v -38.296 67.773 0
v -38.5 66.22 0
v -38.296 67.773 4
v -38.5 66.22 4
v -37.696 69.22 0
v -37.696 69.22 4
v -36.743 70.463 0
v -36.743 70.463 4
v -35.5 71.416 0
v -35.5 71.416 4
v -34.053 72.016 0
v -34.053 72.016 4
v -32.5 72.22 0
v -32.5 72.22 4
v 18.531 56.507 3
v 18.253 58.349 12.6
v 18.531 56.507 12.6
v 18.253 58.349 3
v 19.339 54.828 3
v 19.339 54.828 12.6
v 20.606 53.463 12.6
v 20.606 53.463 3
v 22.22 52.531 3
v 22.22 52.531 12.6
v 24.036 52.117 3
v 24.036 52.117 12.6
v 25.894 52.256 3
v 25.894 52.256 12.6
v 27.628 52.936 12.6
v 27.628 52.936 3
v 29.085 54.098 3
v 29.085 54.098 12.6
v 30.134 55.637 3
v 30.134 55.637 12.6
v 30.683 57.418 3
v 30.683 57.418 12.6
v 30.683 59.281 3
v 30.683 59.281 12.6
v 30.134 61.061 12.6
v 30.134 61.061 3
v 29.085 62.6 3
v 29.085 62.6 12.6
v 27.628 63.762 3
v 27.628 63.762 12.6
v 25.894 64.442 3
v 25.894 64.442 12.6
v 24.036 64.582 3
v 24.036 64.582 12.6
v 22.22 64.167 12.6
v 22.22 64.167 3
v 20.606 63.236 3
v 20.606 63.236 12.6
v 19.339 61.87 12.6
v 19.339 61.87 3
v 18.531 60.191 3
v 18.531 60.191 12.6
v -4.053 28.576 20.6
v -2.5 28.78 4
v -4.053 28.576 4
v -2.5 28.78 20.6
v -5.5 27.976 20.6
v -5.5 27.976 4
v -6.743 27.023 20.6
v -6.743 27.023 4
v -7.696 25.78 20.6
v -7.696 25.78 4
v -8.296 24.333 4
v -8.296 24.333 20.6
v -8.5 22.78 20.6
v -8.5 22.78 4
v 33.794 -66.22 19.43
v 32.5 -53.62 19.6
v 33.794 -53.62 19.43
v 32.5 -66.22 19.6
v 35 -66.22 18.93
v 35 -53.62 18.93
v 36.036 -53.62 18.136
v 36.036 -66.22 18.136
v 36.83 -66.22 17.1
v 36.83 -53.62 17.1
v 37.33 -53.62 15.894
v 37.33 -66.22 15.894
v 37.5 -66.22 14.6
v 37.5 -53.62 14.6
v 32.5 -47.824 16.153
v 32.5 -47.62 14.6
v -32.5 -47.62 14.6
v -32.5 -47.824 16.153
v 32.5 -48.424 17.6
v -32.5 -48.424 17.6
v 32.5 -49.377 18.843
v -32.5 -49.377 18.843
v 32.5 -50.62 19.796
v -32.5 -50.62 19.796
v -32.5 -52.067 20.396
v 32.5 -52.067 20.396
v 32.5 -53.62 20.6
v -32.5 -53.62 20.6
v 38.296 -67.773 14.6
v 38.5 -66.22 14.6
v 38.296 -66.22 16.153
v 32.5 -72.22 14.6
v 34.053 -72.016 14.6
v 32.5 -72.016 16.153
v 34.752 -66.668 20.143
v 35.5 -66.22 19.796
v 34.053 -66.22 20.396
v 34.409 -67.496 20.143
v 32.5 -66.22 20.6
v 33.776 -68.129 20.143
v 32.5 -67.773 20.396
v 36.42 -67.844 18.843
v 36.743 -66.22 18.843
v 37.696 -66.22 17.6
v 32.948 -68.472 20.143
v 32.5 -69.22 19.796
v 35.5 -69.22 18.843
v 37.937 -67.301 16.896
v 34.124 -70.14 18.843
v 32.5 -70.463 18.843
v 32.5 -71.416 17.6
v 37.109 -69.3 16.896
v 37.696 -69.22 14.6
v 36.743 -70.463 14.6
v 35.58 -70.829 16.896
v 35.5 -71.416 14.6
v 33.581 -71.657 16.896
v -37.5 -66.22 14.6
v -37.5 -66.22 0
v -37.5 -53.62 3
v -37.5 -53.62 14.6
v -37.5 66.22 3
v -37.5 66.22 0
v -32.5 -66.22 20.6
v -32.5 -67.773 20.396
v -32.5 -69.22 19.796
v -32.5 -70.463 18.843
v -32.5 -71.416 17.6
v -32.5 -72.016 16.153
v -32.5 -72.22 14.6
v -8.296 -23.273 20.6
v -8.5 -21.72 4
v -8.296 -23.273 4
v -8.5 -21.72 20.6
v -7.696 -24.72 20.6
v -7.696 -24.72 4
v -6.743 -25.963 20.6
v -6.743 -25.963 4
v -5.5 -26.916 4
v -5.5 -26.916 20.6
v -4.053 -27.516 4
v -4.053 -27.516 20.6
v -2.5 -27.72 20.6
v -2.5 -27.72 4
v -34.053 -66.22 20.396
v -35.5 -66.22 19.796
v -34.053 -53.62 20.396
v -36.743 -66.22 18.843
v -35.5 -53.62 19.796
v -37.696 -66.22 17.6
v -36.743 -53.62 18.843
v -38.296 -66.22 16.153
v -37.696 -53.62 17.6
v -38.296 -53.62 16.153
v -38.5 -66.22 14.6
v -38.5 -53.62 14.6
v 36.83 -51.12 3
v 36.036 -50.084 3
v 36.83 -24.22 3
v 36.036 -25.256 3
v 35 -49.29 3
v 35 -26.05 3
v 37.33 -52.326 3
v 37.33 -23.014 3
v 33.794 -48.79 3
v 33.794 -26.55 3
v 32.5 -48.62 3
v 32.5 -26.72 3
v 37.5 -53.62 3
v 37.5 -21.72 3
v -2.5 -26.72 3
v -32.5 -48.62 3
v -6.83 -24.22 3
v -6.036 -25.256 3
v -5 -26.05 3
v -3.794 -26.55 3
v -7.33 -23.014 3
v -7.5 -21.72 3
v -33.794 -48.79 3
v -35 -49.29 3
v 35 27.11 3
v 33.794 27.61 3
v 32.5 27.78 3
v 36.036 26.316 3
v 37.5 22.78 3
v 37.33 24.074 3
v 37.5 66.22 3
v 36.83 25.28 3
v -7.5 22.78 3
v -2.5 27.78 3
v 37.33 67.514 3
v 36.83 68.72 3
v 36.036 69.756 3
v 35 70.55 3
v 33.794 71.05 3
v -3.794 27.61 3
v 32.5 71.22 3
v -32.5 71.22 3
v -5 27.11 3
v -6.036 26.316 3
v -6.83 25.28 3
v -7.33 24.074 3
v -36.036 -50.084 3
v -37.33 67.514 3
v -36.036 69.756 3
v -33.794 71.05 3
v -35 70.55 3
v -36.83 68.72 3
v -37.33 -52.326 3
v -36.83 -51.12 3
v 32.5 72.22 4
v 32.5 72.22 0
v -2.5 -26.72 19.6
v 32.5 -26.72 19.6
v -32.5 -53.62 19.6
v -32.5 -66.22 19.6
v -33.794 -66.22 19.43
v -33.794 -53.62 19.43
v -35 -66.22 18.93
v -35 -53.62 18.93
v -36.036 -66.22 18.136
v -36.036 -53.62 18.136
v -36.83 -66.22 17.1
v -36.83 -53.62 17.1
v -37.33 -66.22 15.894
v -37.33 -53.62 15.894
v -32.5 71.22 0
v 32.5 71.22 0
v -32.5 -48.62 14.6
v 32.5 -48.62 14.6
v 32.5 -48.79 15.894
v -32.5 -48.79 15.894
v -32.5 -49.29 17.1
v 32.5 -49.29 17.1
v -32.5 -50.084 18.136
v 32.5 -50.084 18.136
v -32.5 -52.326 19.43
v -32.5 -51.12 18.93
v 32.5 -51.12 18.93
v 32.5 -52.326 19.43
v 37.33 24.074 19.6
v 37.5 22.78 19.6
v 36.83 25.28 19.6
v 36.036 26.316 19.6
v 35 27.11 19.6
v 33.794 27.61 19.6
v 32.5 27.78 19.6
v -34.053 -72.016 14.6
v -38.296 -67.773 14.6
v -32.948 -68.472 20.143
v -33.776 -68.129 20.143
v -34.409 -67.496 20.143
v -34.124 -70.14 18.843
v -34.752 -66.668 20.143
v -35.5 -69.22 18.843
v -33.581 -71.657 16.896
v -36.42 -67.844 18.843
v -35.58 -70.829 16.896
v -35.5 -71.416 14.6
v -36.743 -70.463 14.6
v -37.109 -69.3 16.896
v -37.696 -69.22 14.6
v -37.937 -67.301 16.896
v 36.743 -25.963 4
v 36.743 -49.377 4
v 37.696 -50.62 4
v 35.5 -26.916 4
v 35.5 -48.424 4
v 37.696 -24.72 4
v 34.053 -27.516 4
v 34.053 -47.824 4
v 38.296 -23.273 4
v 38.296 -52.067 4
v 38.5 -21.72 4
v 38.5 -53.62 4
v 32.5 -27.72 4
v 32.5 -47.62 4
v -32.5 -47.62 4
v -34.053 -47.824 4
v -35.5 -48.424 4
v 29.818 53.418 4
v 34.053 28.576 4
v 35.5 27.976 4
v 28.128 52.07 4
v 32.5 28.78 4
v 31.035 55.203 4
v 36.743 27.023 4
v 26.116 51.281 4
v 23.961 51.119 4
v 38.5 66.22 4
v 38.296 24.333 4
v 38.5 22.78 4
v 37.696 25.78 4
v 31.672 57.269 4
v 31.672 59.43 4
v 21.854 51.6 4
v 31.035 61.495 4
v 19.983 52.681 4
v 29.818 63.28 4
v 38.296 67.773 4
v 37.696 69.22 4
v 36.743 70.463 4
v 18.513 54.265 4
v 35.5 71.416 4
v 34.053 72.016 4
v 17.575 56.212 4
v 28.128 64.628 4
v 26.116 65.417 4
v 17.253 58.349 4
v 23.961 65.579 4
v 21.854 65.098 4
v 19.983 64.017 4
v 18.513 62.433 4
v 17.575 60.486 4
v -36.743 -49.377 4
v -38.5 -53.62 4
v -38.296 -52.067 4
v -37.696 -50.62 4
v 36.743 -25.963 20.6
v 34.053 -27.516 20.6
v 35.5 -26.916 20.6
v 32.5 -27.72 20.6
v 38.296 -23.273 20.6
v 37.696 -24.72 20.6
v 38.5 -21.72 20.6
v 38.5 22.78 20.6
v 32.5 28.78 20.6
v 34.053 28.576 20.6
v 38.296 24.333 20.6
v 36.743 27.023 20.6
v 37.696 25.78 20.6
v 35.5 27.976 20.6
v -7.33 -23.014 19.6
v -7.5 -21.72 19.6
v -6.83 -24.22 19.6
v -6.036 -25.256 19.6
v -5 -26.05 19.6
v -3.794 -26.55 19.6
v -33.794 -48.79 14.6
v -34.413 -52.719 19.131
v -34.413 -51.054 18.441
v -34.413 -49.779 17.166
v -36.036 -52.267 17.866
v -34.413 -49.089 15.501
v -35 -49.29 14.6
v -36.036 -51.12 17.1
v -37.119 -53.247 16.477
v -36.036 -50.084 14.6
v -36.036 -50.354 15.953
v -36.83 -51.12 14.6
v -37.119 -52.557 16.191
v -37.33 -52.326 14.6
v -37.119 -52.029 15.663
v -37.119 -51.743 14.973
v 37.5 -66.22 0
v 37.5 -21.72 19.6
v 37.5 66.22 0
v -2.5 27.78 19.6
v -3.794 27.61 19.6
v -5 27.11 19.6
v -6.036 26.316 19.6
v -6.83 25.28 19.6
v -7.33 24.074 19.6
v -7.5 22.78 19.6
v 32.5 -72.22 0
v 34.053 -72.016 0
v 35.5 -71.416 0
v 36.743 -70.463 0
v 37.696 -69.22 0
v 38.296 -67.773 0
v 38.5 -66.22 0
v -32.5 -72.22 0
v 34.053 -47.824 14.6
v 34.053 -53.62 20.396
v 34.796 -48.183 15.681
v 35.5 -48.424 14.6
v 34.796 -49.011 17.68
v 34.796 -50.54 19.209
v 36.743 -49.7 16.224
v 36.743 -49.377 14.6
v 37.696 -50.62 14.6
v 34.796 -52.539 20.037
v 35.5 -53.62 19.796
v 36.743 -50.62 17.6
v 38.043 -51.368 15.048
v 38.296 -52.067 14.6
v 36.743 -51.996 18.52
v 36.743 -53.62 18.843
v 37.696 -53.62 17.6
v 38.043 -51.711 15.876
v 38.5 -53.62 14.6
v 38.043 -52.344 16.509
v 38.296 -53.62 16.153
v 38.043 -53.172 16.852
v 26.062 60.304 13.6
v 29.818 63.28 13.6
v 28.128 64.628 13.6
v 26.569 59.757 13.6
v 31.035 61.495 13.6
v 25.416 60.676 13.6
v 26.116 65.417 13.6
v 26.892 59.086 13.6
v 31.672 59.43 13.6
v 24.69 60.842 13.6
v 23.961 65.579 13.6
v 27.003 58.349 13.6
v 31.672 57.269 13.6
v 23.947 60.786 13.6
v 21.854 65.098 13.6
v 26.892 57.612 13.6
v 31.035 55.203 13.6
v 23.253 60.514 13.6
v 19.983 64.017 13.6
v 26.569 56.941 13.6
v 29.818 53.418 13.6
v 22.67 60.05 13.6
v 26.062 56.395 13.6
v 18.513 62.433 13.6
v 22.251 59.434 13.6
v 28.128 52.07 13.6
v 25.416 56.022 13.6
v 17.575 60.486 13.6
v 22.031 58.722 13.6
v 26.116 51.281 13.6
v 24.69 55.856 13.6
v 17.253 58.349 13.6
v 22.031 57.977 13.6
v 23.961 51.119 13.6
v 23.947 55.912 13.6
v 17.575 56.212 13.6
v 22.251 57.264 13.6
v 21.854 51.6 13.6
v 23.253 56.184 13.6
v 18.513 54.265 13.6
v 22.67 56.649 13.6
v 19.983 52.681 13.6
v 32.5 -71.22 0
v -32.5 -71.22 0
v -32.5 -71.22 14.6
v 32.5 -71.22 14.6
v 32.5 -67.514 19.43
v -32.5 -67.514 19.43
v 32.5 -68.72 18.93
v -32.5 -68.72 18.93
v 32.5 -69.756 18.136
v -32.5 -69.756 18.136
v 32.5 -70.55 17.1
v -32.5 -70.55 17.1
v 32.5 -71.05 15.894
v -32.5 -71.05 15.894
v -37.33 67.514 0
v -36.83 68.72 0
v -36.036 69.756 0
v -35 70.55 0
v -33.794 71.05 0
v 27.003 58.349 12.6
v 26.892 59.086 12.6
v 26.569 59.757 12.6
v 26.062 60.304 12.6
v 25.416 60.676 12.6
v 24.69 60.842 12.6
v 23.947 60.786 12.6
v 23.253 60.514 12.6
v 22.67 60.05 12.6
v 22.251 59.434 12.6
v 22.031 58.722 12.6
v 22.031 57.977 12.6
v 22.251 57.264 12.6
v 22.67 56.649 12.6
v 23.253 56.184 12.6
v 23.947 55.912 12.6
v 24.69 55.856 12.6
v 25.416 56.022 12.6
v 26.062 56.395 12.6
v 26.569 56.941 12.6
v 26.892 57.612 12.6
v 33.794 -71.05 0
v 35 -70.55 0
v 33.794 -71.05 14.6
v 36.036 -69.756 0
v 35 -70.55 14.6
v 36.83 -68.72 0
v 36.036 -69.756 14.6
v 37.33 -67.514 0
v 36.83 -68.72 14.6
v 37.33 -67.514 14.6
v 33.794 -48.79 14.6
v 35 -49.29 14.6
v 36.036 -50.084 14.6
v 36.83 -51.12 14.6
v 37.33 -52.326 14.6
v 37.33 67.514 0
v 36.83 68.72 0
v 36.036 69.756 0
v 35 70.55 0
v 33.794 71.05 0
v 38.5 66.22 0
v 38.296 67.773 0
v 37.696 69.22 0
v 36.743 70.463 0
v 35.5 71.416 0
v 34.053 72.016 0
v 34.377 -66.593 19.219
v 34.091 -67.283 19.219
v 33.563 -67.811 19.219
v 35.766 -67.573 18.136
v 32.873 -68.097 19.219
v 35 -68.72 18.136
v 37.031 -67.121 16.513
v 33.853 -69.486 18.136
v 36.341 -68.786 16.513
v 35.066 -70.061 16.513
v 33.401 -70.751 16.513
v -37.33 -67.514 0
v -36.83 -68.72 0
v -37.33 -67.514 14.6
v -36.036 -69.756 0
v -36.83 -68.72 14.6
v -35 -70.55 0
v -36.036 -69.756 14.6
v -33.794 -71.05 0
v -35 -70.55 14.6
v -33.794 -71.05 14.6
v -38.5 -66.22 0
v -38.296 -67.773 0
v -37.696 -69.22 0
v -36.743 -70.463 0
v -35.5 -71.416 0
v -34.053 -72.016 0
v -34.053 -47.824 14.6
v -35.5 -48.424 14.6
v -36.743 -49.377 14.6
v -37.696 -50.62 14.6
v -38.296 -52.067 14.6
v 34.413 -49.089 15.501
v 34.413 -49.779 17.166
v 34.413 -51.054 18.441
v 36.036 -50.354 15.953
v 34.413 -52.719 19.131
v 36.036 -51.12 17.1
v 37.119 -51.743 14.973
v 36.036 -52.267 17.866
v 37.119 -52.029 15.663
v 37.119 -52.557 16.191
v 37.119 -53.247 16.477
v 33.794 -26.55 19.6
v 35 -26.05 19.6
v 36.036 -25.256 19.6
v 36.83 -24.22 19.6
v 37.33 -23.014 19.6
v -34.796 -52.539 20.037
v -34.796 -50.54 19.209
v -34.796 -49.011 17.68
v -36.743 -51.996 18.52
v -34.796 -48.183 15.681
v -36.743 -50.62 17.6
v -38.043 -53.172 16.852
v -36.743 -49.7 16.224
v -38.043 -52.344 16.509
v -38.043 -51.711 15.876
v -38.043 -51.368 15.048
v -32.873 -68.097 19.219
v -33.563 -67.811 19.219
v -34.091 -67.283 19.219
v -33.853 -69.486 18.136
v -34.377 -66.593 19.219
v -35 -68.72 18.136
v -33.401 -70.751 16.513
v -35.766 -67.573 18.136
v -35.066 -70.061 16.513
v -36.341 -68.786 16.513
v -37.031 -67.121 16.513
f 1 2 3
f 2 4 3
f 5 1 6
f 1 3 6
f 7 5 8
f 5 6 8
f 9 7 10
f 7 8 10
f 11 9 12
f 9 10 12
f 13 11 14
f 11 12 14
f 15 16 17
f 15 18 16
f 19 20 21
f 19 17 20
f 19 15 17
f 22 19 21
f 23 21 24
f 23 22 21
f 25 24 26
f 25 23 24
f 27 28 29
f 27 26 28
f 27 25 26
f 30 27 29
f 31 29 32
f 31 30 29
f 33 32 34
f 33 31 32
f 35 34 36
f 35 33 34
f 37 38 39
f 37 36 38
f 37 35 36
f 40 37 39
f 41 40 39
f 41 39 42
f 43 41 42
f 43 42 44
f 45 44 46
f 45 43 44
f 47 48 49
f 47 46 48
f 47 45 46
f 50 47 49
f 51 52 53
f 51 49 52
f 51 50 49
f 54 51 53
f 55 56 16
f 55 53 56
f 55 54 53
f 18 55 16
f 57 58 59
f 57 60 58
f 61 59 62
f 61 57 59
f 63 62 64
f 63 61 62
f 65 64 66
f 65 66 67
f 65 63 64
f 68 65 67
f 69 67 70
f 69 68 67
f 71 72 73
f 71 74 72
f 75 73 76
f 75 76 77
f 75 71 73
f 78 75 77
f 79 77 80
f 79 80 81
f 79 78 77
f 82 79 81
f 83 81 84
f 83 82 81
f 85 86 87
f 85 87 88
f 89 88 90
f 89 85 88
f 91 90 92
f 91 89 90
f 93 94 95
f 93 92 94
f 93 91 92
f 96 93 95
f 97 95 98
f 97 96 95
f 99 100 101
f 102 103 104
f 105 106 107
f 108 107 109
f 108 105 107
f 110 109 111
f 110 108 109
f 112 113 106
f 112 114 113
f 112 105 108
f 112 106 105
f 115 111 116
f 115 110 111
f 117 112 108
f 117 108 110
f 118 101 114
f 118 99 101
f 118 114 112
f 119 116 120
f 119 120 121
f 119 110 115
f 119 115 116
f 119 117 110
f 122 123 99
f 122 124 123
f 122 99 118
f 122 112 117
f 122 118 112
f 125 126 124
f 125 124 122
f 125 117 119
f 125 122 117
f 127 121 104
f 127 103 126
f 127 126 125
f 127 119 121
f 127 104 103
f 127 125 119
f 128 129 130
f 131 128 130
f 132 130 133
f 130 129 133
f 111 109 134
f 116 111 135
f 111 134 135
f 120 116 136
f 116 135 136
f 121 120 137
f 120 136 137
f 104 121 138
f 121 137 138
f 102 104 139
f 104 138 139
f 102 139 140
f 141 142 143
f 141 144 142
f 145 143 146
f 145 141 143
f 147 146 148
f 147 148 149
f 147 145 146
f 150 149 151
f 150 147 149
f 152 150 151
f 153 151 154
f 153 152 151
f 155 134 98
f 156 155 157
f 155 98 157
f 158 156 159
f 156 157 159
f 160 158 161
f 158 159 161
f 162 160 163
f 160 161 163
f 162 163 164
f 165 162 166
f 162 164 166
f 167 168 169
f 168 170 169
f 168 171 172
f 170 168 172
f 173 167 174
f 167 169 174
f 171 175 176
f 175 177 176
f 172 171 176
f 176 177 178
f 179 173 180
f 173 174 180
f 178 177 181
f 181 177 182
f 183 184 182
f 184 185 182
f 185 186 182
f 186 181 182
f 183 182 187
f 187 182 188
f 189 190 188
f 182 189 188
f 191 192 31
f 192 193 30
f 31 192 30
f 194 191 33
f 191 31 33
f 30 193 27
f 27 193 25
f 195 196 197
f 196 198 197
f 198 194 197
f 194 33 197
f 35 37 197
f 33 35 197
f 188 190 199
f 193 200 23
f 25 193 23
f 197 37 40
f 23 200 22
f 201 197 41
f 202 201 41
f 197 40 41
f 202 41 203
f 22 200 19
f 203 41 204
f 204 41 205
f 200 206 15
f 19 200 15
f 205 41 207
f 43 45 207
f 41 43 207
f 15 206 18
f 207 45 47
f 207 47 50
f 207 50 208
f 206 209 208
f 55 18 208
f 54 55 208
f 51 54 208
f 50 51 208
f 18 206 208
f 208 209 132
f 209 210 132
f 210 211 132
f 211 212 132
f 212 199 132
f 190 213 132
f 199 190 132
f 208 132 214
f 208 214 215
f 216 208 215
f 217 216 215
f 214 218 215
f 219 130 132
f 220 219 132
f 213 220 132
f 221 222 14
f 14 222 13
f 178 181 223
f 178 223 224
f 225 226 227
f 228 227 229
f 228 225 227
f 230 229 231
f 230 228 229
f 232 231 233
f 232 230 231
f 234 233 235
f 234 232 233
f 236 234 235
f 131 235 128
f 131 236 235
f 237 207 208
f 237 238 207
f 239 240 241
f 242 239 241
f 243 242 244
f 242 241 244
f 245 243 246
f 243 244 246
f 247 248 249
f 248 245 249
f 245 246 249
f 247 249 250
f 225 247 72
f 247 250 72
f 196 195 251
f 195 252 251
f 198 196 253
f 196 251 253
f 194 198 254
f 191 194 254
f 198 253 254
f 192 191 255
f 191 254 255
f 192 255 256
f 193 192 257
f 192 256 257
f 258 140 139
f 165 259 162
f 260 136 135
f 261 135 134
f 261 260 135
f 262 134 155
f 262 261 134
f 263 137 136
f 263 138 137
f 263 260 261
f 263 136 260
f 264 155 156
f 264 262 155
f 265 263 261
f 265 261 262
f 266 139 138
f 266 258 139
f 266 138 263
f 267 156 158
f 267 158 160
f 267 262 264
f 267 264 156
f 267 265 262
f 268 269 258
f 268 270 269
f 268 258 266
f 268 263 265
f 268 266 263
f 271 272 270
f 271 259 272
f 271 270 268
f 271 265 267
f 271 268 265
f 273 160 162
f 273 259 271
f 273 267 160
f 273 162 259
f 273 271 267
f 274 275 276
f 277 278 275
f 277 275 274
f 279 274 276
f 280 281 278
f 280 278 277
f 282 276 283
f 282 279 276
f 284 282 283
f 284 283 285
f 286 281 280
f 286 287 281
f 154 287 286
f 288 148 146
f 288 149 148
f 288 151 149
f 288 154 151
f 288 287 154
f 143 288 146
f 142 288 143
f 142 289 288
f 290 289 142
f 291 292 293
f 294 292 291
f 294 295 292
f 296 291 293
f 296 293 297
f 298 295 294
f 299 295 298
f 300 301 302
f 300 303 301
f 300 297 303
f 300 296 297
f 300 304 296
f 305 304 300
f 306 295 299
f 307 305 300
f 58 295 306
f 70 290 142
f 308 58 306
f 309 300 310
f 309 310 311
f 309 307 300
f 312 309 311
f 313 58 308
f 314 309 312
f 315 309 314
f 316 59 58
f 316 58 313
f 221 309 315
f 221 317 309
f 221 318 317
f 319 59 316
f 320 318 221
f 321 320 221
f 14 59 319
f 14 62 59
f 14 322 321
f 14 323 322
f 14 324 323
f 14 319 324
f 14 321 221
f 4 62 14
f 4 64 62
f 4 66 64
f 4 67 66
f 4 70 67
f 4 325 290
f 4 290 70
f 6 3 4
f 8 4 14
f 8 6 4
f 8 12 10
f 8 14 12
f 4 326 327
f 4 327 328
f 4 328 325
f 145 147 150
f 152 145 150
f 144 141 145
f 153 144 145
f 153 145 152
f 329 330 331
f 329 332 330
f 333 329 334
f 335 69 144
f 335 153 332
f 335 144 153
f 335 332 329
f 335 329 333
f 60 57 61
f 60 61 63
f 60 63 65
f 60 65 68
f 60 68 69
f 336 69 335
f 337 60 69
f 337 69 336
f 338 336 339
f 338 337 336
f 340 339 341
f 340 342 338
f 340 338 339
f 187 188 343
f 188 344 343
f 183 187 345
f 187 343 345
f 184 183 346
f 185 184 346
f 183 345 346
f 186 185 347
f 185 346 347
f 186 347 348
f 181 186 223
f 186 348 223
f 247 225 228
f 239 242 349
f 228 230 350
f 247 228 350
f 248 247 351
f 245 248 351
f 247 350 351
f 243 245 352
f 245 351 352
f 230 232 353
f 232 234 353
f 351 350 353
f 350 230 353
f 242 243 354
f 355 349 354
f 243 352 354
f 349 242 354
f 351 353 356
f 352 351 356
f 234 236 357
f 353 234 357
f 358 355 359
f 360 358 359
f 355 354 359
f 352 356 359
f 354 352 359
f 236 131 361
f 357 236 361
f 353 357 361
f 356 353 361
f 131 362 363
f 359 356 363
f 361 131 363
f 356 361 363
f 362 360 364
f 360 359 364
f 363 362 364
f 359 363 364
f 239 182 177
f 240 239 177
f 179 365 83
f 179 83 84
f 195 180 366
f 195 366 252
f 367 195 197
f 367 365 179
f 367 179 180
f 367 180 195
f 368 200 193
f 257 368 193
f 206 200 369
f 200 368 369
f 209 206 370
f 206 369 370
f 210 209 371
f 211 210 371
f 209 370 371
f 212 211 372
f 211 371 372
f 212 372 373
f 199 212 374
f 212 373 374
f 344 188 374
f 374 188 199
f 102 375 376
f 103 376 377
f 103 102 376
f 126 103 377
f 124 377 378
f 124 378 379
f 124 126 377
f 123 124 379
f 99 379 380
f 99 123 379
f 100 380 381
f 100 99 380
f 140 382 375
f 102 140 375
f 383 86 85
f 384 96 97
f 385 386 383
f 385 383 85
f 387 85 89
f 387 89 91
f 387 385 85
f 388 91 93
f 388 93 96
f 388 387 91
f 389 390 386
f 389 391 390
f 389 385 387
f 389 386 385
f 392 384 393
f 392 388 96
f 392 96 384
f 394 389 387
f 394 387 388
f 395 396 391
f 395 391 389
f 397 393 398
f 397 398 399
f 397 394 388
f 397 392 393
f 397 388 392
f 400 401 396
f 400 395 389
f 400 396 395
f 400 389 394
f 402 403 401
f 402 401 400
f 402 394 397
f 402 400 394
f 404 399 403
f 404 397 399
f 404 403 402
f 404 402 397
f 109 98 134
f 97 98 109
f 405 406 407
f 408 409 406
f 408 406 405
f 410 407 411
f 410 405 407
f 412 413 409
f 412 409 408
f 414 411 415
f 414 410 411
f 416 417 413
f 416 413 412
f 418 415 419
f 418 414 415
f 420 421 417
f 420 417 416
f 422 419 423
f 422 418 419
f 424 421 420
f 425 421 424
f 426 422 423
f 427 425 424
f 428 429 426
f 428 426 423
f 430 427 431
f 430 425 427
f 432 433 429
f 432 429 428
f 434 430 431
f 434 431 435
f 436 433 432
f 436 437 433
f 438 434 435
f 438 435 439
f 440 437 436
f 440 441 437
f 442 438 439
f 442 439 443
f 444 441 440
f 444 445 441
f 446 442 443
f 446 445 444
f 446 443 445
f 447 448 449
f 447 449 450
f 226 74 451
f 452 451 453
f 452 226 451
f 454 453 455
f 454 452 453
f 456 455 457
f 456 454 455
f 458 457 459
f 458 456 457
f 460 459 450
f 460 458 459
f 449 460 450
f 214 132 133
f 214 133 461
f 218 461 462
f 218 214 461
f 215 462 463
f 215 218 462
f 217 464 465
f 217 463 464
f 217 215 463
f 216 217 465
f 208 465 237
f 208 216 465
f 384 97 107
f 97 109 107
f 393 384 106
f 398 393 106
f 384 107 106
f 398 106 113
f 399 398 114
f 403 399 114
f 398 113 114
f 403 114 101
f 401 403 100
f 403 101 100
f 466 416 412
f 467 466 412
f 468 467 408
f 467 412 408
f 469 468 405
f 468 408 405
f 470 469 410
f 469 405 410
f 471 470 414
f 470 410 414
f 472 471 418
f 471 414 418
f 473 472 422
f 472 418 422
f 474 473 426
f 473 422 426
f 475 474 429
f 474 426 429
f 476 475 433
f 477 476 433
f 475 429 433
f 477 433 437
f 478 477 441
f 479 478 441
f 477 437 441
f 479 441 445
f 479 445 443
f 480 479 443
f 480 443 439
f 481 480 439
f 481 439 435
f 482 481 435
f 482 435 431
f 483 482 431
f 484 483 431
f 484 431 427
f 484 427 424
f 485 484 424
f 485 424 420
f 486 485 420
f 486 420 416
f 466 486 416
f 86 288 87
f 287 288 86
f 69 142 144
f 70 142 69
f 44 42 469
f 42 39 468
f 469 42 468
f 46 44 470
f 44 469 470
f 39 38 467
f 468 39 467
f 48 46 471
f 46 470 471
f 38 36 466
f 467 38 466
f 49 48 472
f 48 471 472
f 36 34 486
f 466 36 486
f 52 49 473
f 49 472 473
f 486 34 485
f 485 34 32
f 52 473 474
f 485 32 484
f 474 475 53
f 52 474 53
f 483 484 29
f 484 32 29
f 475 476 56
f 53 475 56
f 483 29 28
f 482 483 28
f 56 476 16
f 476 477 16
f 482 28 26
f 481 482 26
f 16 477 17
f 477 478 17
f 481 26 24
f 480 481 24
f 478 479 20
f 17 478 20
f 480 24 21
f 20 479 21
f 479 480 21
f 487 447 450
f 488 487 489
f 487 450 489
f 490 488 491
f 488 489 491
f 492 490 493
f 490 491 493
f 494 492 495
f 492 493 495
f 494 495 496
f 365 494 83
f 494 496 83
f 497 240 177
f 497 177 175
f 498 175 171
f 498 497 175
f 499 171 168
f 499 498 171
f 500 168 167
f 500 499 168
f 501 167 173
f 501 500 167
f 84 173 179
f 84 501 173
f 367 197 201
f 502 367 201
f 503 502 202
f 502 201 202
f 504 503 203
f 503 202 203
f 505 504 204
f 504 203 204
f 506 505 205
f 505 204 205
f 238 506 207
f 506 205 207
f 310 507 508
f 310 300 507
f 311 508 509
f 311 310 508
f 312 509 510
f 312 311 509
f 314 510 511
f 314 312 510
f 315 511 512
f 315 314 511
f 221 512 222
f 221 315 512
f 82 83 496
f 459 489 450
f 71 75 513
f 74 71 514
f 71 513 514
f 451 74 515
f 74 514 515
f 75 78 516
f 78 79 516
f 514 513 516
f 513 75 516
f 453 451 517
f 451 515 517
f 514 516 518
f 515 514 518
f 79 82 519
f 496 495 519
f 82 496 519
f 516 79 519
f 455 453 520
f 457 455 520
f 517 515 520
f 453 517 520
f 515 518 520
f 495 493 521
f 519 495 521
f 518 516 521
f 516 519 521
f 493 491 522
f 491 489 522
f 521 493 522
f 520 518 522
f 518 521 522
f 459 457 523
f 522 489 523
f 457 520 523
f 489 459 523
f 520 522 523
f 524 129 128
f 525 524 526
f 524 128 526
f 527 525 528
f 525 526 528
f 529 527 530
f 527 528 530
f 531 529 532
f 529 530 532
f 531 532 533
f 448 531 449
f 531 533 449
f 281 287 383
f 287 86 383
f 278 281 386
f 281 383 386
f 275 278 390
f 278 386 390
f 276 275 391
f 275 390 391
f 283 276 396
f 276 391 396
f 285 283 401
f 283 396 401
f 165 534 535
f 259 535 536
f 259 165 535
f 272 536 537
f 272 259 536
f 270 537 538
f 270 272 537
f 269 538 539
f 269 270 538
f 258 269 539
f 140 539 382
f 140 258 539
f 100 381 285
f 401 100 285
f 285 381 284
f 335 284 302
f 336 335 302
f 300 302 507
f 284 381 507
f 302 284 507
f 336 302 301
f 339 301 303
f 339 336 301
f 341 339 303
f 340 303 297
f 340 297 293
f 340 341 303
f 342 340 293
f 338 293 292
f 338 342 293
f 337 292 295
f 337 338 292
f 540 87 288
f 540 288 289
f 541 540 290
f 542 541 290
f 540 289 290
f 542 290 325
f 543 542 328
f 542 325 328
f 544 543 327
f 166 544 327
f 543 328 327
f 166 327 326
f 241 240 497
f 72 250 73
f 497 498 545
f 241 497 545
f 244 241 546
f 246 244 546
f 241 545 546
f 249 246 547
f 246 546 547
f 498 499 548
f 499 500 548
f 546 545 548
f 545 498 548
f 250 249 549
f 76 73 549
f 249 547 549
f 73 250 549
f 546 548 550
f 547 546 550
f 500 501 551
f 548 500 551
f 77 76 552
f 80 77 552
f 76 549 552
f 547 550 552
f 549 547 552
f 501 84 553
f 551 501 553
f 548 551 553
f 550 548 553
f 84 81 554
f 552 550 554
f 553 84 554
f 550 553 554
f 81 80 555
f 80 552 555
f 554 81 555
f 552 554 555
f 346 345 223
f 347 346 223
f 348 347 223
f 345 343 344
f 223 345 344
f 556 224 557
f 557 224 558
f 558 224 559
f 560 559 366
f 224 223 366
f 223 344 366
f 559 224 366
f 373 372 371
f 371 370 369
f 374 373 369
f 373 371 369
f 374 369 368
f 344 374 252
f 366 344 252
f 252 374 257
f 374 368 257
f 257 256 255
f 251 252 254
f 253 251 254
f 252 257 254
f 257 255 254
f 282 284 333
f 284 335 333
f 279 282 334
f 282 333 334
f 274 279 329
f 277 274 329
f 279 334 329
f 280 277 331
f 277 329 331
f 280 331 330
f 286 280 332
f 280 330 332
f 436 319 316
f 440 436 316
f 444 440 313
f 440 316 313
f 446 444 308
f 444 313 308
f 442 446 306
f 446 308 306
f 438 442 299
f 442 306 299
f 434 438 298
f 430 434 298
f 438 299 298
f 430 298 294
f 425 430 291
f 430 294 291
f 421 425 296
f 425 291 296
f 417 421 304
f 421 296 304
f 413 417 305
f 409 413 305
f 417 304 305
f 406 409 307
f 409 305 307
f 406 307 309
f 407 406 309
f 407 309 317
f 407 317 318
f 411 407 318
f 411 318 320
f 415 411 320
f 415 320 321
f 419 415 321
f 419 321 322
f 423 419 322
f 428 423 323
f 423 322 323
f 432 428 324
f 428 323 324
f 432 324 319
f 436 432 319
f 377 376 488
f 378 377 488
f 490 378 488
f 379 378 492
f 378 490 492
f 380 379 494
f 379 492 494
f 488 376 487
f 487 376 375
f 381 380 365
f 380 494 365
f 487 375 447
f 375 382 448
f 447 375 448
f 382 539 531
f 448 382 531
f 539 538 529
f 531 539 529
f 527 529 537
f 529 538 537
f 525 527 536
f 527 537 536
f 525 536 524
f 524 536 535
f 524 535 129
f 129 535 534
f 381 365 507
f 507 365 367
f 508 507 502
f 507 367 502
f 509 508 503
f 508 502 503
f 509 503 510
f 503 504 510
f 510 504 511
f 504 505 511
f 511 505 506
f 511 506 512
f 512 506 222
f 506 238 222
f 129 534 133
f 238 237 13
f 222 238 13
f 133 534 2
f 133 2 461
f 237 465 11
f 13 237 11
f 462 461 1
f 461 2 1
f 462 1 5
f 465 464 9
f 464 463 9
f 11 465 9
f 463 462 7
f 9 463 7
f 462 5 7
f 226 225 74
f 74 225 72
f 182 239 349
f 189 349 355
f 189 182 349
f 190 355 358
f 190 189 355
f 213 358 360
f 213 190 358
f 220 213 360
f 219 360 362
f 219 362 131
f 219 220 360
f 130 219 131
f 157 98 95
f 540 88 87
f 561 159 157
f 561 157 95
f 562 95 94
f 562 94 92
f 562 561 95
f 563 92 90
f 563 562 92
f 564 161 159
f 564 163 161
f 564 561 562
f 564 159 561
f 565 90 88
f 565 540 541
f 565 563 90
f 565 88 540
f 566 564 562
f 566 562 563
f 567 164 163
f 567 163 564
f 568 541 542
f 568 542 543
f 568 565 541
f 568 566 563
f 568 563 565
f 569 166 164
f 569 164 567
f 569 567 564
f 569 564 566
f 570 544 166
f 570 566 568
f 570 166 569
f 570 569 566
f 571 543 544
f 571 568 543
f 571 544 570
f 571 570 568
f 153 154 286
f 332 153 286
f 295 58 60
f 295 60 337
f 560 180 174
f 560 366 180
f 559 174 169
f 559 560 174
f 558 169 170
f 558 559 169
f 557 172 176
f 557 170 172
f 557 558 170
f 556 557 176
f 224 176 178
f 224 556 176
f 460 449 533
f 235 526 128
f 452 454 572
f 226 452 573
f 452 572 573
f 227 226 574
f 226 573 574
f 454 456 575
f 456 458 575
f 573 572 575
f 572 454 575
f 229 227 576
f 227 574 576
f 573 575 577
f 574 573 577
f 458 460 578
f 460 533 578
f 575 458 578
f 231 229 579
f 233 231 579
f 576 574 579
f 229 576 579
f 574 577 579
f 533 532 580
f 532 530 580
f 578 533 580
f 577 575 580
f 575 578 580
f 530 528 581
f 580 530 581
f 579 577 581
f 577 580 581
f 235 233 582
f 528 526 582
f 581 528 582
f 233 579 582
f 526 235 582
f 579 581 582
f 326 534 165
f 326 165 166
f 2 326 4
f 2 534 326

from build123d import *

# Parameters (mm, degrees)
SKIZZE2_W                       = 144.44
SKIZZE2_H                       = 77
AUFSATZ_LINEAR_AUSTRAGEN1_DEPTH = 4
SKIZZE4_W                       = 77
SKIZZE4_H                       = 24.6
AUFSATZ_LINEAR_AUSTRAGEN2_DEPTH = 16.6
VERRUNDUNG2_R                   = 6
SKIZZE5_W                       = 47
SKIZZE5_H                       = 56.5
AUFSATZ_LINEAR_AUSTRAGEN3_DEPTH = 16.6
VERRUNDUNG4_R                   = 6
SKIZZE7_R                       = 7.25
AUFSATZ_LINEAR_AUSTRAGEN5_DEPTH = 9.6
VERRUNDUNG5_R                   = 6
VERRUNDUNG7_R                   = 6
WANDUNG2_T                      = -1
SKIZZE8_R                       = 2.5
SCHNITT_LINEAR_AUSTRAGEN1_DEPTH = 83.963476301


with BuildPart() as part:
    # Skizze2 → Aufsatz-Linear austragen1 (new body)
    with BuildSketch(Plane(origin=(0, 0, 0), x_dir=(0, 1, 0), z_dir=(0, 0, 1))):
        Rectangle(SKIZZE2_W, SKIZZE2_H)
    extrude(amount=AUFSATZ_LINEAR_AUSTRAGEN1_DEPTH)

    # Skizze4 → Aufsatz-Linear austragen2 (add)
    with BuildSketch(Plane.XY.offset(4)):
        with Locations((0, -59.92)):
            Rectangle(SKIZZE4_W, SKIZZE4_H)
    extrude(amount=AUFSATZ_LINEAR_AUSTRAGEN2_DEPTH)

    # Verrundung2
    verrundung2_edges = [part.edges().sort_by_distance(p)[0] for p in [
        (38.5, 72.22, 2),
        (38.5, -72.22, 10.3),
        (-38.5, -72.22, 10.3),
        (-38.5, 72.22, 2),
    ]]
    fillet(verrundung2_edges, radius=VERRUNDUNG2_R)

    # Skizze5 → Aufsatz-Linear austragen3 (add)
    with BuildSketch(Plane.XY.offset(4)):
        with Locations((15, 0.53)):
            Rectangle(SKIZZE5_W, SKIZZE5_H)
    extrude(amount=AUFSATZ_LINEAR_AUSTRAGEN3_DEPTH)

    # Verrundung4
    verrundung4_edges = [part.edges().sort_by_distance(p)[0] for p in [
        (38.5, -27.72, 12.3),
        (38.5, 28.78, 12.3),
        (-8.5, 28.78, 12.3),
        (-8.5, -27.72, 12.3),
    ]]
    fillet(verrundung4_edges, radius=VERRUNDUNG4_R)

    # Skizze7 → Aufsatz-Linear austragen5 (add)
    with BuildSketch(Plane.XY.offset(4)):
        with Locations(Location((24.503110224, 58.349132978, 0), (0, 0, 180))):
            Circle(SKIZZE7_R)
    extrude(amount=AUFSATZ_LINEAR_AUSTRAGEN5_DEPTH)

    # Verrundung5
    verrundung5_edges = [part.edges().sort_by_distance(p)[0] for p in [
        (0, -47.62, 20.6),
    ]]
    fillet(verrundung5_edges, radius=VERRUNDUNG5_R)

    # Verrundung7
    verrundung7_edges = [part.edges().sort_by_distance(p)[0] for p in [
        (-38.5, -59.92, 20.6),
        (-38.5, -47.62, 9.3),
        (-38.5, -49.377359313, 18.842640687),
        (38.5, -47.62, 9.3),
        (38.5, -49.377359313, 18.842640687),
        (38.5, -59.92, 20.6),
        (0, -72.22, 20.6),
        (-36.742640687, -70.462640687, 20.6),
        (36.742640687, -70.462640687, 20.6),
    ]]
    fillet(verrundung7_edges, radius=VERRUNDUNG7_R)

    # Wandung2
    wandung2_openings = [part.faces().sort_by_distance(p)[0] for p in [
        (0, 0, 0),
    ]]
    offset(amount=WANDUNG2_T, openings=wandung2_openings, kind=Kind.INTERSECTION)

    # Skizze8 → Schnitt-Linear austragen1 (cut, through all)
    with BuildSketch(Plane.XY.offset(13.6)):
        with Locations((24.503110224, 58.349132978)):
            Circle(SKIZZE8_R)
    extrude(amount=-SCHNITT_LINEAR_AUSTRAGEN1_DEPTH, mode=Mode.SUBTRACT)


solid = part.part
